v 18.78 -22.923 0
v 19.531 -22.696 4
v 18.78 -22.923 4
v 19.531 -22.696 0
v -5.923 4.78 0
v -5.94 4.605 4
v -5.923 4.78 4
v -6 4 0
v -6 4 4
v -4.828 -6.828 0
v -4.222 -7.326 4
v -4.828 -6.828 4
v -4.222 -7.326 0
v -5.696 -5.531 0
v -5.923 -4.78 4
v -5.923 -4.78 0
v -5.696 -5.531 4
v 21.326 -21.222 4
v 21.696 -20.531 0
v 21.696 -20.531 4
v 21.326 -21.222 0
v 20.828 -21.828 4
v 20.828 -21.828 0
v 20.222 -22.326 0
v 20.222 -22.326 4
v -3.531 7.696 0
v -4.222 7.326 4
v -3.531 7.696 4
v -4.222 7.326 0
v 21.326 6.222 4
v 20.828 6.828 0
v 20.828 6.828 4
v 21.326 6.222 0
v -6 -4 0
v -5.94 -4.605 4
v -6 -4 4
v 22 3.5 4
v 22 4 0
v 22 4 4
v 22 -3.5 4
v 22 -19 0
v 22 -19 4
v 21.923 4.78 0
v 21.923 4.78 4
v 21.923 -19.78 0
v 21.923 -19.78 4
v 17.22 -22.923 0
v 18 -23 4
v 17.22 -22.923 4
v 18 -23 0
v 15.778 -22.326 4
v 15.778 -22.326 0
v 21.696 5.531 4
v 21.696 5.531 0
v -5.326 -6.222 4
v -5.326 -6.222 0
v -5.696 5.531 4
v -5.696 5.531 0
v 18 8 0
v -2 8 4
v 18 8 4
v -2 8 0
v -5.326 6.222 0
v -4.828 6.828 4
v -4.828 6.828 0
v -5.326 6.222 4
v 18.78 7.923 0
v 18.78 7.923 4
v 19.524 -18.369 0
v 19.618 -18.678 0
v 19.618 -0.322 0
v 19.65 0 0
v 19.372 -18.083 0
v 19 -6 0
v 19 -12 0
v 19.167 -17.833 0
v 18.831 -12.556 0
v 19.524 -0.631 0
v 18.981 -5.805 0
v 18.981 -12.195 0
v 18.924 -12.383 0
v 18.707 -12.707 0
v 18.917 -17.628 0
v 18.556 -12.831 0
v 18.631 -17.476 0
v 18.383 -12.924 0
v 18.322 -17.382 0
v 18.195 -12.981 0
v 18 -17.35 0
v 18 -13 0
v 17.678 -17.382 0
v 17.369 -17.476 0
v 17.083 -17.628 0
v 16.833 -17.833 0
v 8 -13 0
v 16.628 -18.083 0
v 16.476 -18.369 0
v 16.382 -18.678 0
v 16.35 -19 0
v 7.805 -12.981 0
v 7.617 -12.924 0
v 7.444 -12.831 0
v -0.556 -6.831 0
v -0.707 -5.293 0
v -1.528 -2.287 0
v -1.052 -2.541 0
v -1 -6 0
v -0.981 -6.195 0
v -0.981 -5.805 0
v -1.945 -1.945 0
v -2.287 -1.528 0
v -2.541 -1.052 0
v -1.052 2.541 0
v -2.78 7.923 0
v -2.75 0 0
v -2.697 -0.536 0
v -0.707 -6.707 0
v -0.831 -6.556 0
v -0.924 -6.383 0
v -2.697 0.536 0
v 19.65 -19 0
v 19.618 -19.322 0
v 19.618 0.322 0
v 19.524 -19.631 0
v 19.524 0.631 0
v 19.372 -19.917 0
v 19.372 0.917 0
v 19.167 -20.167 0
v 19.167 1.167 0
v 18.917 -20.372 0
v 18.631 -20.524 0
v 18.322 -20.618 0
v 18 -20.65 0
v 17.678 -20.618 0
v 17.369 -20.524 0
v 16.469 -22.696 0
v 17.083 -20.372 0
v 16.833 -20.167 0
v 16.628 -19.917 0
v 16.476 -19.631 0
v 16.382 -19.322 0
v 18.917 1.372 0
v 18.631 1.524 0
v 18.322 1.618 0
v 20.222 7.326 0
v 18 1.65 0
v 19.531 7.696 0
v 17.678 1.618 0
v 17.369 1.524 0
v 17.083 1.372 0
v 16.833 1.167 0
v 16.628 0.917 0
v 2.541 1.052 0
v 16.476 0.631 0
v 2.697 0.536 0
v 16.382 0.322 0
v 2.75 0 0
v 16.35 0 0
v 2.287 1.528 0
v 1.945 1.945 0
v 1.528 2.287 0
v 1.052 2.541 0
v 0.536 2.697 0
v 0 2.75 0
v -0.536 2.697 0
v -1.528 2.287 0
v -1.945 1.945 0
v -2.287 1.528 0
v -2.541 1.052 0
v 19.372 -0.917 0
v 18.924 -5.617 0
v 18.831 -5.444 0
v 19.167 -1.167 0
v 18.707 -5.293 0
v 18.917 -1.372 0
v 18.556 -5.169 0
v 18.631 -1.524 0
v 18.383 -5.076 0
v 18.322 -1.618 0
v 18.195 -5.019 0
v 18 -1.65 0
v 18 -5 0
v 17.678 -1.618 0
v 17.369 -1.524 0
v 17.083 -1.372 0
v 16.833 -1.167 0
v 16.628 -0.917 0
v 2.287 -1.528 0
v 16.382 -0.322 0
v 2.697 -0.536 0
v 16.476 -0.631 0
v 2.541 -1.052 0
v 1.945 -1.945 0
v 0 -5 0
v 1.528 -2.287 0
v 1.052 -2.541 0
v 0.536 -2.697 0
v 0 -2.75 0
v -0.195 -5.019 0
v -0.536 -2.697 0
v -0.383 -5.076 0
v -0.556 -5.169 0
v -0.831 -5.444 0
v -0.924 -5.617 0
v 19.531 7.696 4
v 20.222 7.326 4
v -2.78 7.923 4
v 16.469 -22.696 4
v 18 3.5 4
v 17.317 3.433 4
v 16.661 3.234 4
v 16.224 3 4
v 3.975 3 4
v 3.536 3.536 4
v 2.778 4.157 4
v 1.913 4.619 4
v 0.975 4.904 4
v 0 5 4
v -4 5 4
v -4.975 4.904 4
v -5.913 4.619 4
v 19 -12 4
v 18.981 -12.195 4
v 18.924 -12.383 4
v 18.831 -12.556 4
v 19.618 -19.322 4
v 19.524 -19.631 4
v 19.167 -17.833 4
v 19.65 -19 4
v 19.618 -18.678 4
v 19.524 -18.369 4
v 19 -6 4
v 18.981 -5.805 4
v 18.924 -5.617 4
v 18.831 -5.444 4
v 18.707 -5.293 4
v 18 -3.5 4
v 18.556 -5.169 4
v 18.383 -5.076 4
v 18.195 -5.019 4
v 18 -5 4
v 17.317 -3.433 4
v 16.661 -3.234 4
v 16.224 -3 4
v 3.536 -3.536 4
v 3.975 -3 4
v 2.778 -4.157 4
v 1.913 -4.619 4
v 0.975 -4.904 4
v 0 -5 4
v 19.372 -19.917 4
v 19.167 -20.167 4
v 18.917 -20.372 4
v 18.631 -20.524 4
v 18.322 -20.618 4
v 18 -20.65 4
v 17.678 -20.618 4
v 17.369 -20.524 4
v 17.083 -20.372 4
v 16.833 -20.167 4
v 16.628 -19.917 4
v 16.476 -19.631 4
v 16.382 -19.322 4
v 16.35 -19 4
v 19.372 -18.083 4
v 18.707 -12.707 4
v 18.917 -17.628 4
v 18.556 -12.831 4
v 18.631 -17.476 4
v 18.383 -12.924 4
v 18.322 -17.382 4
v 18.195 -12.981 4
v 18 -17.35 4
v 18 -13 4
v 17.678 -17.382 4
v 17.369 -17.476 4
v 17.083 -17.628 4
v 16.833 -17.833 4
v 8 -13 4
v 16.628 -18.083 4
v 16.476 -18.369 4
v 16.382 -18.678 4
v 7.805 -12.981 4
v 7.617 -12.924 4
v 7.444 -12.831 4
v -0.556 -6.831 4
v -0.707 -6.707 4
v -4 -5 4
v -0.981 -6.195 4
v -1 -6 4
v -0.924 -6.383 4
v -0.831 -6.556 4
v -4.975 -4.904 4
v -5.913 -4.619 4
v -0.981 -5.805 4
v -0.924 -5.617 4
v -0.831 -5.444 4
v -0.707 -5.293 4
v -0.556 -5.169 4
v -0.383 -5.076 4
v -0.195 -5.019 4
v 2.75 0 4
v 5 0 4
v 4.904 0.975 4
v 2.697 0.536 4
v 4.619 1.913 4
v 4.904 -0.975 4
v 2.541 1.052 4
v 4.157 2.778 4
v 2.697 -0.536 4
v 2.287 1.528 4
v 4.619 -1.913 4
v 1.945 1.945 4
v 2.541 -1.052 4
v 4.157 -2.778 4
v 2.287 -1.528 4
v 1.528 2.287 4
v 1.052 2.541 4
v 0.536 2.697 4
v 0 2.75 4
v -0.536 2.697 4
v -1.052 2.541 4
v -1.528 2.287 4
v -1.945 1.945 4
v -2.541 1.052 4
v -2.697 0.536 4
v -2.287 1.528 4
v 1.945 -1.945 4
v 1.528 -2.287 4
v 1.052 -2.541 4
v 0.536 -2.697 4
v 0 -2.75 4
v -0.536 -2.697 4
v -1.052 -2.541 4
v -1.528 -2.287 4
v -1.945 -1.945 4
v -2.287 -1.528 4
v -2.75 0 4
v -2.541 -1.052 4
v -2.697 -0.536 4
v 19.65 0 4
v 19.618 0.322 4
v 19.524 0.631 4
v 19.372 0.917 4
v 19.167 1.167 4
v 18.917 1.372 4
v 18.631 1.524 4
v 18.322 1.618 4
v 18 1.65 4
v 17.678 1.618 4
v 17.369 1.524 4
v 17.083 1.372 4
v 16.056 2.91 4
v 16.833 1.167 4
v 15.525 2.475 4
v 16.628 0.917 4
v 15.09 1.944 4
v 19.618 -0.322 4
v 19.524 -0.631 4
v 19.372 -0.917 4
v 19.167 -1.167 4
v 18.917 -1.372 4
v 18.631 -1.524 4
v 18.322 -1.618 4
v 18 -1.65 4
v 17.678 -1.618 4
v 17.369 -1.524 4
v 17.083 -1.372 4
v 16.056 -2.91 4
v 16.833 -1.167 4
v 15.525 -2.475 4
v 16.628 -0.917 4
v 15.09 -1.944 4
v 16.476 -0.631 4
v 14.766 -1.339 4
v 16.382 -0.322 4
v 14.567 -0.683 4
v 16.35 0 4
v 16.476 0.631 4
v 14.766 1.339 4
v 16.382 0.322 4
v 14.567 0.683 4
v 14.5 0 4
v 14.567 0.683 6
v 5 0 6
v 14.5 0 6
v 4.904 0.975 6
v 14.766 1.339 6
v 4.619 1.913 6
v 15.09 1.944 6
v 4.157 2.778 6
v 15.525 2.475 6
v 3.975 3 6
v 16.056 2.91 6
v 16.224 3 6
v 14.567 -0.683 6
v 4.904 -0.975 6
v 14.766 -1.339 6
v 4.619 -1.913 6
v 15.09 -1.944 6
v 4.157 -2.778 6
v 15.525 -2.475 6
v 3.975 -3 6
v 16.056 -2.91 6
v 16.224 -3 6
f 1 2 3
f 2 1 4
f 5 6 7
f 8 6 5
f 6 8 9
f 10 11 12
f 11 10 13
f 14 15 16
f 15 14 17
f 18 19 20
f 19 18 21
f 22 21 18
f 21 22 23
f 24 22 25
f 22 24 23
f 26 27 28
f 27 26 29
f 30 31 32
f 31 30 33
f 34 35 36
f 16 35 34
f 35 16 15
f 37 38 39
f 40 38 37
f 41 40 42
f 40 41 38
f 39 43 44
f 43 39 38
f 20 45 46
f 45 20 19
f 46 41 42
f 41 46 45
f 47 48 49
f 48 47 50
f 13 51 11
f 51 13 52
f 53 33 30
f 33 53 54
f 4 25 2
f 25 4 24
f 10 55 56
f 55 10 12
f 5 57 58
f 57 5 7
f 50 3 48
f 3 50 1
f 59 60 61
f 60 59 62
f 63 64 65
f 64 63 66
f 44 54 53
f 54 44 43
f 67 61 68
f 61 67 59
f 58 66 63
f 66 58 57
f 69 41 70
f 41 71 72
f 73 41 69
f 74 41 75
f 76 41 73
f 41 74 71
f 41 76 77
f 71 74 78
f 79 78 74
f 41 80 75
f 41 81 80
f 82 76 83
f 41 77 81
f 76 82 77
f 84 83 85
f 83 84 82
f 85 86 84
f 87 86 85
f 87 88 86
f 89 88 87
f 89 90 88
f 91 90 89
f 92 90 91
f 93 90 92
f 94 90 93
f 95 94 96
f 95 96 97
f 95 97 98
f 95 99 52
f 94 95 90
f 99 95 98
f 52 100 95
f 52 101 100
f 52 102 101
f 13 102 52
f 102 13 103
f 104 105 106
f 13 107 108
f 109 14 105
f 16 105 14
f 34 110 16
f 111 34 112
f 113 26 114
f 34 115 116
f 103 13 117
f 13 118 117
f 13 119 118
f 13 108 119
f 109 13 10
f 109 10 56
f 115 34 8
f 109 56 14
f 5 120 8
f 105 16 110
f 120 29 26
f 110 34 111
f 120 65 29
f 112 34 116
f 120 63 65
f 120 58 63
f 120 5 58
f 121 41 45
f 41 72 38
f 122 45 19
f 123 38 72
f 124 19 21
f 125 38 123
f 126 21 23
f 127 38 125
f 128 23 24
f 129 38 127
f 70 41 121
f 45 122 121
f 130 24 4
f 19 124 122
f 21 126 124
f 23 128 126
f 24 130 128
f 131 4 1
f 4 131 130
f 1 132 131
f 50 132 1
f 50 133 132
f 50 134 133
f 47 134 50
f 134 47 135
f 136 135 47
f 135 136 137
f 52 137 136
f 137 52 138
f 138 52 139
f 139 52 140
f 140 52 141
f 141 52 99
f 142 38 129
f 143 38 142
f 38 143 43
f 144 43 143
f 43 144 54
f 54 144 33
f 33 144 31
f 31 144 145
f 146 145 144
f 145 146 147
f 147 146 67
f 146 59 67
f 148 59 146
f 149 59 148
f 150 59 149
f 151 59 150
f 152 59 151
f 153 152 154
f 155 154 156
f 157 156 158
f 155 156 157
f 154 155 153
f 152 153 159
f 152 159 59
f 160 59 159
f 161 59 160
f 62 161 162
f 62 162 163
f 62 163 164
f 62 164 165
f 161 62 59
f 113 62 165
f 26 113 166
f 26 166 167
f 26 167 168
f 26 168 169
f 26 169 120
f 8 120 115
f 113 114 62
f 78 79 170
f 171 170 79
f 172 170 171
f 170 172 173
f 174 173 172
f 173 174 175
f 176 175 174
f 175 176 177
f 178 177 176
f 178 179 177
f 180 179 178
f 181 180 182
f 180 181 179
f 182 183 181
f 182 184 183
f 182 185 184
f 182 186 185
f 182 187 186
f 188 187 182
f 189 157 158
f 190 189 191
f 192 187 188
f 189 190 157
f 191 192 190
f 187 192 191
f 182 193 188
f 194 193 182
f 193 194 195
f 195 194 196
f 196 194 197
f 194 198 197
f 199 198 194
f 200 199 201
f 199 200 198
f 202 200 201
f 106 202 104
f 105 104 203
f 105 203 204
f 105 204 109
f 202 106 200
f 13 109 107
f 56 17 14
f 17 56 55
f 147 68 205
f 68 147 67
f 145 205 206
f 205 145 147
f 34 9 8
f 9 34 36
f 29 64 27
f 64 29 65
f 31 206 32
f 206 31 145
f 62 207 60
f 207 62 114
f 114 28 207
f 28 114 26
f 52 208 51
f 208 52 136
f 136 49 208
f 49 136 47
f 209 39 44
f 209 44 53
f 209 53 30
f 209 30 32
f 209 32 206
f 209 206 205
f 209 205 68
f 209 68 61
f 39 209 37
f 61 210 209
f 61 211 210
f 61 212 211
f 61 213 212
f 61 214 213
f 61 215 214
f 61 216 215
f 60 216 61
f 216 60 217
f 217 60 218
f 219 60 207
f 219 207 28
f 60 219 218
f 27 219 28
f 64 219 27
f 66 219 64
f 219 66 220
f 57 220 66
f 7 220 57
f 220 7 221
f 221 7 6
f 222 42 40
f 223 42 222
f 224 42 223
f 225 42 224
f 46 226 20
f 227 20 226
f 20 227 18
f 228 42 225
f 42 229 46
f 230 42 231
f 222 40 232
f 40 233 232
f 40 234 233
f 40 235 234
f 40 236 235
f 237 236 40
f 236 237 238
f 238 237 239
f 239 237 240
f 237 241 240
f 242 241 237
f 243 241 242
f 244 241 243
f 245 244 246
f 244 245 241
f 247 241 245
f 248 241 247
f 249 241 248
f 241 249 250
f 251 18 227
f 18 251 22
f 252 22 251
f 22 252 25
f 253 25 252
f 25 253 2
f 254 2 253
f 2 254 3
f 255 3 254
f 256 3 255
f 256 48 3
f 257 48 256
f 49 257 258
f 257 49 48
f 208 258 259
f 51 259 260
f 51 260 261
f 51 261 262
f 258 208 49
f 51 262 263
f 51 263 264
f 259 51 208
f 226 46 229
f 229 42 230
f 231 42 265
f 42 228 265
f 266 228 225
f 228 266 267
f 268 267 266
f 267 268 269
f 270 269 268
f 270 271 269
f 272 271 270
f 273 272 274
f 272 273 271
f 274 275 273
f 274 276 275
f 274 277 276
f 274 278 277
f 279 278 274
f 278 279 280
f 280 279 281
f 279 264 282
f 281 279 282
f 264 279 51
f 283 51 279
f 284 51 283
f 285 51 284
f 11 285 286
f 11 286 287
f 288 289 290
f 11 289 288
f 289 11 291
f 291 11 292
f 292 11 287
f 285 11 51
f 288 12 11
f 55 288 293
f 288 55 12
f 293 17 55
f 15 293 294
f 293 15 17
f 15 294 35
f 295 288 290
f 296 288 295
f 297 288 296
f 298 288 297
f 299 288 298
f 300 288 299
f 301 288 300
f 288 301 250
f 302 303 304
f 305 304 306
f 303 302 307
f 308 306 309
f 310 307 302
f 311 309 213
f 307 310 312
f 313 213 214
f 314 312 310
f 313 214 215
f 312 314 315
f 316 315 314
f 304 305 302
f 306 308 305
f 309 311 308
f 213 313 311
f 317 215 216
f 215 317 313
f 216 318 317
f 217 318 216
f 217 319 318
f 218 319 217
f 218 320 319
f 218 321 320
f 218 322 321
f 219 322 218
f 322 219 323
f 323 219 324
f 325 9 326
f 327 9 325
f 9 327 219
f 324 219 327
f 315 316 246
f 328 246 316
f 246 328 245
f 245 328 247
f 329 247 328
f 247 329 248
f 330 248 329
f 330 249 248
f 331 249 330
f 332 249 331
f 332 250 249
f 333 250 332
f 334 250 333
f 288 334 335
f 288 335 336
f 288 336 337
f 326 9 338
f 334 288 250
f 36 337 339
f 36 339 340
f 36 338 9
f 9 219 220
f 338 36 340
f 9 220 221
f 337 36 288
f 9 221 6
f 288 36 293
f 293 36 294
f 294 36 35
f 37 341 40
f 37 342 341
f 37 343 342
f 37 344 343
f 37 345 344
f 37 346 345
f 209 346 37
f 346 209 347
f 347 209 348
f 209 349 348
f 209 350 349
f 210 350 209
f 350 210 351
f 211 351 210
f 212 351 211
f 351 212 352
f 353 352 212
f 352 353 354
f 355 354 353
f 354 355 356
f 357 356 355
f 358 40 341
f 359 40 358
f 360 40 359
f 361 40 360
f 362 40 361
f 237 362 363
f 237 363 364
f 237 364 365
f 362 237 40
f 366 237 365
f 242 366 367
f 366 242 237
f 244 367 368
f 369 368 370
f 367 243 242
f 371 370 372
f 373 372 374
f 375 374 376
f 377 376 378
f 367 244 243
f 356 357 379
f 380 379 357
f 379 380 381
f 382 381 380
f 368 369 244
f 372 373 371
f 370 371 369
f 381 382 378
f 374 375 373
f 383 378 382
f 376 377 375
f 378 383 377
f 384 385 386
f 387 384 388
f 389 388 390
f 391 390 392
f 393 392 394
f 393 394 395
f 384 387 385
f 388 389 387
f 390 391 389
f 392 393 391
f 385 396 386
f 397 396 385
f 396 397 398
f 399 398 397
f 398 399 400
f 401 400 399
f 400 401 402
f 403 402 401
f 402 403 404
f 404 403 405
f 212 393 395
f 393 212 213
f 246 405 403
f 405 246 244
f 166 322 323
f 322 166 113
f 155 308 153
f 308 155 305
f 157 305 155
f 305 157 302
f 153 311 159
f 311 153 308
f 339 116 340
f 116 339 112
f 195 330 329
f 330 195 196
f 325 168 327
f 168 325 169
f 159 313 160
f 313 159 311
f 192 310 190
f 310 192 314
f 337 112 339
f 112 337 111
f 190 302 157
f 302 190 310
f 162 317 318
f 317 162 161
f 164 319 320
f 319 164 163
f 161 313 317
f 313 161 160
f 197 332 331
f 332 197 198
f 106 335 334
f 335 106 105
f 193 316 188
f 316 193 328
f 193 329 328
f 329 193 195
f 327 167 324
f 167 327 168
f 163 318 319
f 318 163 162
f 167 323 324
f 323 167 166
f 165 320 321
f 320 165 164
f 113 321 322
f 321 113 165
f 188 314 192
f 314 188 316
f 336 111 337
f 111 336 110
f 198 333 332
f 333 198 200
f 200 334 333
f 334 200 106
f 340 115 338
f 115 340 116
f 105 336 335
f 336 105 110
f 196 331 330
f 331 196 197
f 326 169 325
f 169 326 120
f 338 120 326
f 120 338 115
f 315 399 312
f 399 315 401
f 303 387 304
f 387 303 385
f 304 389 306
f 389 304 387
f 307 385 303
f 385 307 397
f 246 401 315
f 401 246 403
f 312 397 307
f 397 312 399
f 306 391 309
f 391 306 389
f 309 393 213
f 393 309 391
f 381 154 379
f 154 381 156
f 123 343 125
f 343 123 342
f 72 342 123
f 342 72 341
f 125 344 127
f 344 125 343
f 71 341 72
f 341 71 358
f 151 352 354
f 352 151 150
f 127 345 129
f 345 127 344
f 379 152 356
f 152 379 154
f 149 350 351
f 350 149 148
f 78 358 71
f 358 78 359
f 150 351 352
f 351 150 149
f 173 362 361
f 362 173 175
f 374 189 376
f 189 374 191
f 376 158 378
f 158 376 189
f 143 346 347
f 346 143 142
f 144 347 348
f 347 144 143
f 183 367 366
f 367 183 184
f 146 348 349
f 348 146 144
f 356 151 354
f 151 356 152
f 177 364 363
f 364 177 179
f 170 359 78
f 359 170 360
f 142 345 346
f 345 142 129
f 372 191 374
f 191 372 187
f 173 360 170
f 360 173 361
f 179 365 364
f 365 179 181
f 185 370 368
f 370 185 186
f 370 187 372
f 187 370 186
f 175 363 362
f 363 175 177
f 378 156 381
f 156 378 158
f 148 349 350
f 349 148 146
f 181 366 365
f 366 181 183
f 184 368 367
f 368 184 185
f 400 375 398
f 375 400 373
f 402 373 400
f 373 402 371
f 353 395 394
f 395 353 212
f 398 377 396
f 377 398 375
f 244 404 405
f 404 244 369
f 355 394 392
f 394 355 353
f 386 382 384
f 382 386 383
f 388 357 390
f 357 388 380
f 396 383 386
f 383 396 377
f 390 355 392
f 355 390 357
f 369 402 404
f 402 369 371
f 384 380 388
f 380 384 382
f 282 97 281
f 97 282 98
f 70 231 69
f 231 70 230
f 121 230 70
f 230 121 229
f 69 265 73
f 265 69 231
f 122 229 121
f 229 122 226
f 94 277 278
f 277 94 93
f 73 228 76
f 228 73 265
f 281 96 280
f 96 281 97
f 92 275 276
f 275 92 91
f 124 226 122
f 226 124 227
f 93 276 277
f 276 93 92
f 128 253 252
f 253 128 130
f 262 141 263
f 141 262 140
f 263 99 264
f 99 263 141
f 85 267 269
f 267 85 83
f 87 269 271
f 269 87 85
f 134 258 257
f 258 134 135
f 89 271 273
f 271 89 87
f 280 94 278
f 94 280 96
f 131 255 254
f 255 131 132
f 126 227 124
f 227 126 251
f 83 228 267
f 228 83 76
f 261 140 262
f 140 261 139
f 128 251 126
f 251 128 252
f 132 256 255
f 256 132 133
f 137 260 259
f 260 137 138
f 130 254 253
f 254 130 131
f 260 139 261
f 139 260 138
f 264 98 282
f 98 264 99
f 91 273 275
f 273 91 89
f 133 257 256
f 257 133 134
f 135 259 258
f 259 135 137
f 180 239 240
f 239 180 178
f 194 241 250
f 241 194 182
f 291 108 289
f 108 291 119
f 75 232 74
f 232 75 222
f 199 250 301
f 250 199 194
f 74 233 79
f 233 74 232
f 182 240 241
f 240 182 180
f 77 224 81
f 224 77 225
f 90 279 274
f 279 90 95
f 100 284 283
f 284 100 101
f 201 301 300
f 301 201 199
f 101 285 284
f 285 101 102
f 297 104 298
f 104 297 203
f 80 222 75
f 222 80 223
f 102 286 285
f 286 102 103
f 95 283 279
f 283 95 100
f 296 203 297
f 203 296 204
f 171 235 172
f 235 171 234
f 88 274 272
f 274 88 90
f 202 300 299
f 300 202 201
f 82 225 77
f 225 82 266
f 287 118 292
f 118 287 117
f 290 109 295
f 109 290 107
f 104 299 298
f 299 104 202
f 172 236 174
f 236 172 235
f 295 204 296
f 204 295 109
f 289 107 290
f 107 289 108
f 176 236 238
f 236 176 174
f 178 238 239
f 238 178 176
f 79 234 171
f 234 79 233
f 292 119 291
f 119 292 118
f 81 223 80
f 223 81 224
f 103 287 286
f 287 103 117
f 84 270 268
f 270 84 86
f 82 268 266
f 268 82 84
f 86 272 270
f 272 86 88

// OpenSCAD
$fn=32;

endstop_d=19;
endstop_w=18;

difference() {
    union() {
        hull() {
            translate([-2,4,0]) cylinder(r=4,h=4);
            translate([-2,-4,0]) cylinder(r=4,h=4);
            translate([endstop_w,4,0]) cylinder(r=4,h=4);
            translate([endstop_w,-endstop_d,0]) cylinder(r=4,h=4);
        }
        translate([-5,-3,0]) cube([endstop_w+8,6,6]);
    }
    
    //holes
    translate([0,0,-1]) cylinder(d=5.5,h=8);
    hull() {
        translate([-4,0,4]) cylinder(d=10,h=11);
        translate([0,0,4]) cylinder(d=10,h=11);
    }
    translate([endstop_w,0,-1]) cylinder(d=3.3,h=8);
    hull() {
        translate([endstop_w,0,4]) cylinder(d=7,h=8);
        translate([endstop_w+4,0,4]) cylinder(d=7,h=8);
    }
    translate([endstop_w,-endstop_d,-1]) cylinder(d=3.3,h=8);
    
    // szerkezet
    hull() {
        translate([0,-6,-1]) cylinder(r=1,h=8);
        translate([endstop_w,-6,-1]) cylinder(r=1,h=8);
        translate([endstop_w,-endstop_w+6,-1]) cylinder(r=1,h=8);
        translate([8,-endstop_w+6,-1]) cylinder(r=1,h=8);
    }
}
    
